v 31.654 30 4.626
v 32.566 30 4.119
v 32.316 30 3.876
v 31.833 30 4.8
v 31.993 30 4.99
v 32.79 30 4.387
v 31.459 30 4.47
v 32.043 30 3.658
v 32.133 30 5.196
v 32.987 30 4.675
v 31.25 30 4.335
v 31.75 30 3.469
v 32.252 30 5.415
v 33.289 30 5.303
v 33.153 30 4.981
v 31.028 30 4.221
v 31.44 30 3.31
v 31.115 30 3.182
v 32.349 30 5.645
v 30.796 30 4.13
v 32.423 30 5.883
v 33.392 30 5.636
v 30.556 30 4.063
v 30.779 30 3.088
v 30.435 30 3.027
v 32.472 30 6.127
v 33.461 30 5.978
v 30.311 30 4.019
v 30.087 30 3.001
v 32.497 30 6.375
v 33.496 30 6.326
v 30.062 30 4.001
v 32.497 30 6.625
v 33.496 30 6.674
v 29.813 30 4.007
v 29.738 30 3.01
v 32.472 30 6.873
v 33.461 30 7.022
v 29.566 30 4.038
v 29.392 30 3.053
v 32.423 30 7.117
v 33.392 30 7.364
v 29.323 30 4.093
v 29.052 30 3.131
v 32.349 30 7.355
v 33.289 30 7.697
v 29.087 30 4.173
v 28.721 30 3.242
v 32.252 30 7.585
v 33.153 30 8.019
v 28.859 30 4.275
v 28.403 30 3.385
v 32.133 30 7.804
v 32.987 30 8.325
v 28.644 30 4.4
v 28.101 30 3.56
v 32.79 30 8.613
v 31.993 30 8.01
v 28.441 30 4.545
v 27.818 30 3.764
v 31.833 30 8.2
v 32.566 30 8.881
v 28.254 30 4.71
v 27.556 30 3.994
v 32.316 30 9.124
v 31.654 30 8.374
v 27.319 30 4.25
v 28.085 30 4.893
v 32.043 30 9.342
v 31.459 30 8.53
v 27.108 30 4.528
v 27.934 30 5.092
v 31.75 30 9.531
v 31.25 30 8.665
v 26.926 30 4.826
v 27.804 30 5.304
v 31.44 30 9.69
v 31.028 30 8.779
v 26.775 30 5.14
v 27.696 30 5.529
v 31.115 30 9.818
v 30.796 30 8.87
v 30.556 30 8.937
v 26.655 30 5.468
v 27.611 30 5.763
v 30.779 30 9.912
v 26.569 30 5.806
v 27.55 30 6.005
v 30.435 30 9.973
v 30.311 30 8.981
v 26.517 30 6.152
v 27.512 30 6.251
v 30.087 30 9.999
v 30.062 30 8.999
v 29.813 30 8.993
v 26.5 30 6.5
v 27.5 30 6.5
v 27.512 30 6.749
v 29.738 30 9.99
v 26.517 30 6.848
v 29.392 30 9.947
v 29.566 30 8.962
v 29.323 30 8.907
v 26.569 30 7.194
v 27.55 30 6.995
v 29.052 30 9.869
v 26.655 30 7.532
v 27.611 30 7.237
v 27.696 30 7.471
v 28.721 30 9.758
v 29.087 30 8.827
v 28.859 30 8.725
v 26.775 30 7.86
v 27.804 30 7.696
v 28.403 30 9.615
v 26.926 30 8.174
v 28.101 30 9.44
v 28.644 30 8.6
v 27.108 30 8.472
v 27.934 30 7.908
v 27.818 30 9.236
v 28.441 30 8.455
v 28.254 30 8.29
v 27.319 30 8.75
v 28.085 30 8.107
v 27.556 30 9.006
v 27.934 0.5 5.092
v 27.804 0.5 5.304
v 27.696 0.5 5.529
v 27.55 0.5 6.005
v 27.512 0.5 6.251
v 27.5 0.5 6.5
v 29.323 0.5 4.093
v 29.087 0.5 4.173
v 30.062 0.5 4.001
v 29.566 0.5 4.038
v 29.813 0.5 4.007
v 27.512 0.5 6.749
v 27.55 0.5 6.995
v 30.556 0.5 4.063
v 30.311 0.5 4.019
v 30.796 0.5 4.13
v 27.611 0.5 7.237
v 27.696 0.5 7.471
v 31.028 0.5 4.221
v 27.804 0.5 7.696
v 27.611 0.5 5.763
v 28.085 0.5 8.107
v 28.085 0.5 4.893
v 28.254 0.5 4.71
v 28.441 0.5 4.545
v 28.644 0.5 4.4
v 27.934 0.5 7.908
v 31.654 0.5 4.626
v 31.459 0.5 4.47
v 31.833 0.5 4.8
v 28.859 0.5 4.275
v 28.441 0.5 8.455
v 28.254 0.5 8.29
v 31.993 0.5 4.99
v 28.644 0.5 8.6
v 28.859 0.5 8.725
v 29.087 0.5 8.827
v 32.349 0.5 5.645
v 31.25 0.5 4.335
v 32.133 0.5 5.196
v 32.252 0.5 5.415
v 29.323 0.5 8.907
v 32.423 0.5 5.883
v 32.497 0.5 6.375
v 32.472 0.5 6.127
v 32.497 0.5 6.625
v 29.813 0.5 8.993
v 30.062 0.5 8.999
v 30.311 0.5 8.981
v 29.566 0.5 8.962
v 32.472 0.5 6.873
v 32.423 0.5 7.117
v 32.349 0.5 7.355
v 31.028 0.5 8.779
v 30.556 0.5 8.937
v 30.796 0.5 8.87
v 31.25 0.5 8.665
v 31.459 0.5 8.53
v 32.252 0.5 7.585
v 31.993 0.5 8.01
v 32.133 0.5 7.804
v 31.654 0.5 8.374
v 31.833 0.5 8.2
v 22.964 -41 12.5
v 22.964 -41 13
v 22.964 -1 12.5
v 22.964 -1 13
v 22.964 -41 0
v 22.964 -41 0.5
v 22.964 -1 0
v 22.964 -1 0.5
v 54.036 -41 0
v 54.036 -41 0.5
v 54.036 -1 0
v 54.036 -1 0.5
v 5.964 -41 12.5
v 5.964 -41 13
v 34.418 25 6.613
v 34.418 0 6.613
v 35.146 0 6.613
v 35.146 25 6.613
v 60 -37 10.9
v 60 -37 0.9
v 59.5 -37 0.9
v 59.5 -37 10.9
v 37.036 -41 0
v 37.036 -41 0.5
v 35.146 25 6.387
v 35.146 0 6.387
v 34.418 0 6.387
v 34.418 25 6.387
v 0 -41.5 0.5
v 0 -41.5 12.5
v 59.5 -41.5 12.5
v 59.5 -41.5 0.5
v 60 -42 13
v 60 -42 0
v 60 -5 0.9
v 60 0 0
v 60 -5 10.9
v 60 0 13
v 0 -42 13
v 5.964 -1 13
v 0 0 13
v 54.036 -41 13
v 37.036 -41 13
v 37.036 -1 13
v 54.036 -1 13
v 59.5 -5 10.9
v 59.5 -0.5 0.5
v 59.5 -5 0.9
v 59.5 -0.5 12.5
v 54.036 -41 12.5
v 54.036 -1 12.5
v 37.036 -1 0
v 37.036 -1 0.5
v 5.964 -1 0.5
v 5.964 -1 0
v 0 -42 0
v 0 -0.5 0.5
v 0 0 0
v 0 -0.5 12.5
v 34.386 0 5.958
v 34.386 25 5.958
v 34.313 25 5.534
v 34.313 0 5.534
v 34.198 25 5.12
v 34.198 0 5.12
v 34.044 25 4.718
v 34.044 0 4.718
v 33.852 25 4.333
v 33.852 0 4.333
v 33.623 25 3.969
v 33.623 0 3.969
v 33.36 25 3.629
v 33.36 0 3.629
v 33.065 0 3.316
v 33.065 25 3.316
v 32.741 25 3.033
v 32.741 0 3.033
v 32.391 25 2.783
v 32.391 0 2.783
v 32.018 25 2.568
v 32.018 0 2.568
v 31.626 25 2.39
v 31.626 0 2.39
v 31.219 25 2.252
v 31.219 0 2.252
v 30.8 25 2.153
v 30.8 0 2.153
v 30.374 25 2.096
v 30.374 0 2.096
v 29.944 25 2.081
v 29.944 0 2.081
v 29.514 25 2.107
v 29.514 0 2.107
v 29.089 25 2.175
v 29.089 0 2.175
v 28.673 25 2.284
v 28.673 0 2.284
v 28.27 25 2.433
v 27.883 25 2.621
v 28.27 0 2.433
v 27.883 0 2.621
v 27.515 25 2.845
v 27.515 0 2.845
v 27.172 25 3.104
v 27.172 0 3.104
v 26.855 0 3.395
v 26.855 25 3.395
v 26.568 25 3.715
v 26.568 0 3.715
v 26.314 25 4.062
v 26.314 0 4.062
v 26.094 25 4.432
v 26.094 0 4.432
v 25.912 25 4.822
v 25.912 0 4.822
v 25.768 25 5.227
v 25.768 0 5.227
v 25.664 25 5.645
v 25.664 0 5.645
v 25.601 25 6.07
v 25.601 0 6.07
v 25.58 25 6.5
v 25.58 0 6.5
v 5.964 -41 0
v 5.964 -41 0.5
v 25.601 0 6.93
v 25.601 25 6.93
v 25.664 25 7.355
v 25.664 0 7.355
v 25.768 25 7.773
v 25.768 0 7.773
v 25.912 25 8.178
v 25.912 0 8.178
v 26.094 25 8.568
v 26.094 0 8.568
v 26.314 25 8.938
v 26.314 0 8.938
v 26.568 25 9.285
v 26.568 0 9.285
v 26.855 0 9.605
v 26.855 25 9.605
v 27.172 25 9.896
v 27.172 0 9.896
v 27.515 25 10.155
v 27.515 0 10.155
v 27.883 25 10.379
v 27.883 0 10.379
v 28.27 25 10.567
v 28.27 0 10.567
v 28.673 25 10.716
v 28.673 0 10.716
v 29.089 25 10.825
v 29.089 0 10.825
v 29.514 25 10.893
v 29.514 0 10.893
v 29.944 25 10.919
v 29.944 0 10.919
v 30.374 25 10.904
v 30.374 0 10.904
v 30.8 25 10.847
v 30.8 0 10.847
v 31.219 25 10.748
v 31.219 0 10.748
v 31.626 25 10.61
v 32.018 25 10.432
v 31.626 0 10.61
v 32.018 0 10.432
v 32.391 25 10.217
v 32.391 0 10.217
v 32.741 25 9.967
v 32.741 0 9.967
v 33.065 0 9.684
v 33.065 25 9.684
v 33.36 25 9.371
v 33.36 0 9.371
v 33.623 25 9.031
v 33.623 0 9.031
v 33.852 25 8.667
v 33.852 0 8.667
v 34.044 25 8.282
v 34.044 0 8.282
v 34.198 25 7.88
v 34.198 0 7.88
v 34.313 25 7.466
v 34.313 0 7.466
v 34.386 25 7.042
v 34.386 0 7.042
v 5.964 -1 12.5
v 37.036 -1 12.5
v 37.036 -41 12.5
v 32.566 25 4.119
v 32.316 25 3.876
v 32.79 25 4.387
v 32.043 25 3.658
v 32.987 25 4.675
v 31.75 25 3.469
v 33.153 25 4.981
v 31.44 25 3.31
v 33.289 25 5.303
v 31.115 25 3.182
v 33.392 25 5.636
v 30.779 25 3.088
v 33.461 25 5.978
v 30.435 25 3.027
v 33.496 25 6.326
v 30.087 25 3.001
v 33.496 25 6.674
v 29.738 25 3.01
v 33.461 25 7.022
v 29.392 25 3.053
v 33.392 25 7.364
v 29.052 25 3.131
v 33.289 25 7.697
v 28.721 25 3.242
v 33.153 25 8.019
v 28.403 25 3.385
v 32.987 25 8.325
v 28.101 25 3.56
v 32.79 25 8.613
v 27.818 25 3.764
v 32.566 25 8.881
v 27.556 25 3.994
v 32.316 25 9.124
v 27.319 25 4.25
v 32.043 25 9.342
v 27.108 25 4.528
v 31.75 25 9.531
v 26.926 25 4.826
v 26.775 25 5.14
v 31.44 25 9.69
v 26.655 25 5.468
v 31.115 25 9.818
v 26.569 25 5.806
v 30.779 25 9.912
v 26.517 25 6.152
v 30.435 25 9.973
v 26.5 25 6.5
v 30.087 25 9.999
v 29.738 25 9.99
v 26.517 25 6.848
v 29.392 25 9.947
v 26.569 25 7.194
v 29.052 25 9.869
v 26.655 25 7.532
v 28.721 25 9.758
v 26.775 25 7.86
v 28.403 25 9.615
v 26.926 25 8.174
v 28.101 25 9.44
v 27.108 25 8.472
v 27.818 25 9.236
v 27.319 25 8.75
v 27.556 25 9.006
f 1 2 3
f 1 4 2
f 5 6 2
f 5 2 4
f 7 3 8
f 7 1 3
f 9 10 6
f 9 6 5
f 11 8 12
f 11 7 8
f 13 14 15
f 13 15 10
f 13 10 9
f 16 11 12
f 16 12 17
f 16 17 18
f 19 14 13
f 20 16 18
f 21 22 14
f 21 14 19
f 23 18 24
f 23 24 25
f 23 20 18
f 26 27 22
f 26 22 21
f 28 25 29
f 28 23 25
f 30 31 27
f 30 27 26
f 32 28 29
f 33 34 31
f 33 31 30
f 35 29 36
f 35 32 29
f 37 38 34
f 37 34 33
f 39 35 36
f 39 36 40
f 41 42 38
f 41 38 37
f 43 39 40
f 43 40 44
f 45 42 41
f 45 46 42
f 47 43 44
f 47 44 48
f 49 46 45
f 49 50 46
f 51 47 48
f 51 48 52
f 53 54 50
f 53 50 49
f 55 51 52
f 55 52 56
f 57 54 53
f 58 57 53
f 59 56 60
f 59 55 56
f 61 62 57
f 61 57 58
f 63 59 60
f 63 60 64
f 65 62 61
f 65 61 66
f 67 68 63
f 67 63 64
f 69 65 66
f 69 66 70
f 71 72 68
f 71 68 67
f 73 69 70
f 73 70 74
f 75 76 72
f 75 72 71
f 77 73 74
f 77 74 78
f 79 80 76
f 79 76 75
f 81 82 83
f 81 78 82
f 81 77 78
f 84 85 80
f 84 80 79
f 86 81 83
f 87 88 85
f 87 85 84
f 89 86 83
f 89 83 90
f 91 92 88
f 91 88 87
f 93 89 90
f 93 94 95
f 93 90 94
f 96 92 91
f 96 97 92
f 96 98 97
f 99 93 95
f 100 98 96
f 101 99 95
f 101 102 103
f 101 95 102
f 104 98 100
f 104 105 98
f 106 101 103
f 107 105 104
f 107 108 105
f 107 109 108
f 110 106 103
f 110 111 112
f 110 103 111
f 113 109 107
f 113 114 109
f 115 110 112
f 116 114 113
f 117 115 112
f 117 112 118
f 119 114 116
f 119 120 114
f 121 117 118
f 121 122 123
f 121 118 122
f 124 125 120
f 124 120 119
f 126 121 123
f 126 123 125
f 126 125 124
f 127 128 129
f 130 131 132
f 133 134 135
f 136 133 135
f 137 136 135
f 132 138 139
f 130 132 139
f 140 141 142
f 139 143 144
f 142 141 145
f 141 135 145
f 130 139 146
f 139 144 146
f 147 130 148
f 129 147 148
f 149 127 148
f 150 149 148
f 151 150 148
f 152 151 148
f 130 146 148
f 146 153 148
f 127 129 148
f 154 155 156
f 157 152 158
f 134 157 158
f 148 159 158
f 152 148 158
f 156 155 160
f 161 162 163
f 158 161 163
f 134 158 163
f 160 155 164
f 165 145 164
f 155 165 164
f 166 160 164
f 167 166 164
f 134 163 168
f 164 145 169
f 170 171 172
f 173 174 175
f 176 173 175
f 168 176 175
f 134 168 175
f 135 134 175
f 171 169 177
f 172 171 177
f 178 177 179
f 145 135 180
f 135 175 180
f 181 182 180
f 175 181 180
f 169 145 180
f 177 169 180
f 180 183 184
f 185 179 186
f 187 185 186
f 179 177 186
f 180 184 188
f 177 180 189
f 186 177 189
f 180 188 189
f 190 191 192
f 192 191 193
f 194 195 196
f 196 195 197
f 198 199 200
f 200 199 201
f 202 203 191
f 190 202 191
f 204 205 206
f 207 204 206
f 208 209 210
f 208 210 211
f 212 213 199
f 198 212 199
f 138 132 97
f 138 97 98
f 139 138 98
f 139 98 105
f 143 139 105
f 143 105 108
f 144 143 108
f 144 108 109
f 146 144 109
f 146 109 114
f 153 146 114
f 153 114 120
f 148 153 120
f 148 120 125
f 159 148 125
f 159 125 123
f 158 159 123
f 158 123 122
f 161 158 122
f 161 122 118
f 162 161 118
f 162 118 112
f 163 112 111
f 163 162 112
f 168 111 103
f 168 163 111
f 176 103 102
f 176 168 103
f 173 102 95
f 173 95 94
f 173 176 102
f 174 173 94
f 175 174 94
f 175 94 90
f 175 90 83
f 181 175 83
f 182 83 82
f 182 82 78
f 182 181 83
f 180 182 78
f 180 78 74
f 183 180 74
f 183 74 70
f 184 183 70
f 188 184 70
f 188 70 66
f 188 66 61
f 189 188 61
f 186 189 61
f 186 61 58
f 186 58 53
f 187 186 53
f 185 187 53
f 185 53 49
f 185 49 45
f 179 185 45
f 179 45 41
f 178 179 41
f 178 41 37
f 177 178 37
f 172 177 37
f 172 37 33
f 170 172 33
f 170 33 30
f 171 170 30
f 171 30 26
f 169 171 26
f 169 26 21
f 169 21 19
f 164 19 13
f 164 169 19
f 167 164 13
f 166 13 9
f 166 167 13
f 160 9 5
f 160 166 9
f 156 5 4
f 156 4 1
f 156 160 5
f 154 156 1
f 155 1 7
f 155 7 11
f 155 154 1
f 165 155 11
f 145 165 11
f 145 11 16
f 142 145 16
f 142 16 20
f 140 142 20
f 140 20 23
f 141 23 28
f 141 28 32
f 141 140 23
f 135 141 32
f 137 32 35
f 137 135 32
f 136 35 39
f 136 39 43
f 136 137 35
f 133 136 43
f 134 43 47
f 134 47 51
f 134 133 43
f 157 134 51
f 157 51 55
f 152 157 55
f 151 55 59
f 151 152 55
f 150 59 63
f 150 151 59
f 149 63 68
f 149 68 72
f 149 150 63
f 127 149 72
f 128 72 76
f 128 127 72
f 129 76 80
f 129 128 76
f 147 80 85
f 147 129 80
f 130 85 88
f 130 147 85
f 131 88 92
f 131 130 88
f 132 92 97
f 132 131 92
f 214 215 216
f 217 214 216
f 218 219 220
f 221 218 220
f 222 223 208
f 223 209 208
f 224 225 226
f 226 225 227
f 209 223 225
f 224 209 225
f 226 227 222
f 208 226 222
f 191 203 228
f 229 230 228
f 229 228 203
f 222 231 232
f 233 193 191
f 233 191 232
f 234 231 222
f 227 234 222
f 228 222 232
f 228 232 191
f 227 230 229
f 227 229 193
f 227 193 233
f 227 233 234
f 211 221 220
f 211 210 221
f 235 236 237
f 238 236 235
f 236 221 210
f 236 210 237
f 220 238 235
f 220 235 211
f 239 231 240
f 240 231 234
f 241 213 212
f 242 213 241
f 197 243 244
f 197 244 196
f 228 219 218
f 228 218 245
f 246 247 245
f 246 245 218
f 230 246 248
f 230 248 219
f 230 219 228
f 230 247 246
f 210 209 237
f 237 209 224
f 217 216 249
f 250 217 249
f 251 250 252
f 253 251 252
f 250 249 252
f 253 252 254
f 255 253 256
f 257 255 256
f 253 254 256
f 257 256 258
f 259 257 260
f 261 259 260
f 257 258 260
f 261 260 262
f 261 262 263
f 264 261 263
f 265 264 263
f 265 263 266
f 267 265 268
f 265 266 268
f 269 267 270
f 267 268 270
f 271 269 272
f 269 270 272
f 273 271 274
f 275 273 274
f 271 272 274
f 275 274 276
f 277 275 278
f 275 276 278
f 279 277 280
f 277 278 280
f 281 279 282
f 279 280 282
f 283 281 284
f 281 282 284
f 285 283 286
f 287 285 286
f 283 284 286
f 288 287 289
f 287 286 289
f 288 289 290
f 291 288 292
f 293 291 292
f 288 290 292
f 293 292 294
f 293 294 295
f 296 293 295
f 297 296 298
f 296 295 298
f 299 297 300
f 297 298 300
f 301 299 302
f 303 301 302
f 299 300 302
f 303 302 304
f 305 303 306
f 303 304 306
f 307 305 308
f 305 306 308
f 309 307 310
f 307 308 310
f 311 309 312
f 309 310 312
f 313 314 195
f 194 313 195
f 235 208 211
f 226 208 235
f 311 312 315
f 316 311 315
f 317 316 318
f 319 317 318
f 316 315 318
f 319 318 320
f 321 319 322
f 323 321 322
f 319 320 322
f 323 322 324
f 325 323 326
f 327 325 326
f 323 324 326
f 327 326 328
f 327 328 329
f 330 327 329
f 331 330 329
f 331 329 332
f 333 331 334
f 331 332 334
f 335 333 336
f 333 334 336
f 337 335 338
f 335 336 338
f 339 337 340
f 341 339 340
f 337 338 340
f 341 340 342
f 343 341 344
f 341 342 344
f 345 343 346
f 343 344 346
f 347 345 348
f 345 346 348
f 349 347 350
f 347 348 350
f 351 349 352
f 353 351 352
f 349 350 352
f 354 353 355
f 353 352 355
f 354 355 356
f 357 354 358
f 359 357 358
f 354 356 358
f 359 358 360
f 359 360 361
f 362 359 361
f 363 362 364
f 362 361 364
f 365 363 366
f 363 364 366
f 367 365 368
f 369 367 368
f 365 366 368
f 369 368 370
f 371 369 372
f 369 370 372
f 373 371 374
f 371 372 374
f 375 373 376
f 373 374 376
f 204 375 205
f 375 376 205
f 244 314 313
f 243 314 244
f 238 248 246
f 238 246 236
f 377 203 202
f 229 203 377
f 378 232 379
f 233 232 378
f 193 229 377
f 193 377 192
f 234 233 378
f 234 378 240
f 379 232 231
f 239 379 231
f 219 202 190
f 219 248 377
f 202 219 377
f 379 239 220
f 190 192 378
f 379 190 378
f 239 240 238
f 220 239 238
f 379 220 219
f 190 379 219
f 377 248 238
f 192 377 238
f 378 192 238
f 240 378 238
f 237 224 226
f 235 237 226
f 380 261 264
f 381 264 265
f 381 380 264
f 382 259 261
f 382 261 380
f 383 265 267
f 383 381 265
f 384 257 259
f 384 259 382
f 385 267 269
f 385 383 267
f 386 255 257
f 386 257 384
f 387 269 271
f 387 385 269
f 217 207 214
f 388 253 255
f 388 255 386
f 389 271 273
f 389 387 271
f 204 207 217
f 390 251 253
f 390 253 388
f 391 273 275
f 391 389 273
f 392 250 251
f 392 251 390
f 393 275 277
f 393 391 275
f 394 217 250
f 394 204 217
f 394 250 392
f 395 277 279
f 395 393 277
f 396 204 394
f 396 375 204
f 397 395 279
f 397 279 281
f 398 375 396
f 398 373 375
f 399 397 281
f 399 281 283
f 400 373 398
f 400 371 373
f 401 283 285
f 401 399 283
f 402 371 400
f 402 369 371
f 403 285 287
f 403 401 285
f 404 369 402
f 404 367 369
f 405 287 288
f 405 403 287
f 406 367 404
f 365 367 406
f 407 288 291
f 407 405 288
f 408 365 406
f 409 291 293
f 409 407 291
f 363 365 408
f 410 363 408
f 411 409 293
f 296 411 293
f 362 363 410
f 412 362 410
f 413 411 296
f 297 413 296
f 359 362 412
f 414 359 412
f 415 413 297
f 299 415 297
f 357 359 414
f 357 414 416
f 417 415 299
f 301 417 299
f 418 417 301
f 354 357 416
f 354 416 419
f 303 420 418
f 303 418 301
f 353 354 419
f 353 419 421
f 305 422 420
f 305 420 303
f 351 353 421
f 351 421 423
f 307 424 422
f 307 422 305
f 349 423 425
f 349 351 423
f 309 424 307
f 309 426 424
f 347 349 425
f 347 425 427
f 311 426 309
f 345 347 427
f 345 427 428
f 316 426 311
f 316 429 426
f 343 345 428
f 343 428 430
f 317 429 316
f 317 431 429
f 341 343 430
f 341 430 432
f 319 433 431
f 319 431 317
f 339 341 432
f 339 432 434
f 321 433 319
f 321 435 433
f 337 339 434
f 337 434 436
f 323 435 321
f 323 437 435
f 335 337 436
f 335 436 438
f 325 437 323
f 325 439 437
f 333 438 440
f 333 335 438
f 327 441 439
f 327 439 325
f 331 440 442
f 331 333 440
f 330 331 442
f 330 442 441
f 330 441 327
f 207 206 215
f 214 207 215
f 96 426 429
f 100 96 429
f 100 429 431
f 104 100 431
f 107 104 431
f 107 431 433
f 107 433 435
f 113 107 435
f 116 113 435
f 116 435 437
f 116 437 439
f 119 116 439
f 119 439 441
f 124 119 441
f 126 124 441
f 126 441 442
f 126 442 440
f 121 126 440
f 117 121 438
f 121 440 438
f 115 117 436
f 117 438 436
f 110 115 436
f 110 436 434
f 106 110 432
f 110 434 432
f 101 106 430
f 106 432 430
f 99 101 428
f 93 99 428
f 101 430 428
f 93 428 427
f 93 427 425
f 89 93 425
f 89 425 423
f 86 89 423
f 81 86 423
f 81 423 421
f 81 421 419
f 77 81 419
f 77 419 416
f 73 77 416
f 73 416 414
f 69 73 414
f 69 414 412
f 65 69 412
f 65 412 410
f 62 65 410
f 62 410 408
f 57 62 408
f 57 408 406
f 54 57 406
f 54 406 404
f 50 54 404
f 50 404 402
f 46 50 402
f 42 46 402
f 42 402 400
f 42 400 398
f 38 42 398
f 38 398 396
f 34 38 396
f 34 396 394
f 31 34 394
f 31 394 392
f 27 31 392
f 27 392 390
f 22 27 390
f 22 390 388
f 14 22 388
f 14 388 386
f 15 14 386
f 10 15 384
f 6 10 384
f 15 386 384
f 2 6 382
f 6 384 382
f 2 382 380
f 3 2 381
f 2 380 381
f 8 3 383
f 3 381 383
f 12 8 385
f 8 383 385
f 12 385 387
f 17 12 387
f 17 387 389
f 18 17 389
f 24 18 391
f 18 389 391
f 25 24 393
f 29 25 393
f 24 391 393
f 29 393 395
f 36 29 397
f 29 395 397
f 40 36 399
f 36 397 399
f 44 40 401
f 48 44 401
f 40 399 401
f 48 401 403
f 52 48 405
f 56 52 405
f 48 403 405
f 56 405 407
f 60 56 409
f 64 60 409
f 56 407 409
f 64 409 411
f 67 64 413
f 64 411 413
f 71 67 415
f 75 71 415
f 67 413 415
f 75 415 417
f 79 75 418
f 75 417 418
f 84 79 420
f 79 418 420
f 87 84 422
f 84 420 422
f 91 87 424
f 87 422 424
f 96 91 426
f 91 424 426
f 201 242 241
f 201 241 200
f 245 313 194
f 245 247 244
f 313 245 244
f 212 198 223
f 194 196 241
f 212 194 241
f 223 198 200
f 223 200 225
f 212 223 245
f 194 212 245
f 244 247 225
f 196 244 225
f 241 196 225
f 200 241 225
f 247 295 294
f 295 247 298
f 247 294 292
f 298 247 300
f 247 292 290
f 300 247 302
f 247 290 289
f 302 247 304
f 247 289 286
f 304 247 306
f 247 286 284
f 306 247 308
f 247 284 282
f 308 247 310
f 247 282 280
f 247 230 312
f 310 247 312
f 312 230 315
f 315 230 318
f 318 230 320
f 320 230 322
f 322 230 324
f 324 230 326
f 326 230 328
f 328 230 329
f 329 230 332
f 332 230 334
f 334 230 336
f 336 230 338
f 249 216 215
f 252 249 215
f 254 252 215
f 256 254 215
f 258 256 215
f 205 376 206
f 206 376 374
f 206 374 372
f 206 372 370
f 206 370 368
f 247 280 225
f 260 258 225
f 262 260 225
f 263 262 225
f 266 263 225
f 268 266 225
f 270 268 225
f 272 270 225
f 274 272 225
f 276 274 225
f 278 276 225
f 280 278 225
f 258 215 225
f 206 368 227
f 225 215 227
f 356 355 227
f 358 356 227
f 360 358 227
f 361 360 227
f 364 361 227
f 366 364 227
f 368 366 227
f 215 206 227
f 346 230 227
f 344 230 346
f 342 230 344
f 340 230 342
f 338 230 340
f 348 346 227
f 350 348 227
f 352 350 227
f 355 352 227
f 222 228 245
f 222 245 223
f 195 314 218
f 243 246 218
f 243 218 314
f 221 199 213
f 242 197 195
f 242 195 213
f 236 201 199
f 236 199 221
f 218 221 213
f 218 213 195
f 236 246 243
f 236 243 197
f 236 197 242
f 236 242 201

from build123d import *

# Parameters (mm, degrees)
F0_W      = 60
F0_H      = 13
F1_DEPTH  = 42
F2_T      = -0.5
F3_W      = 32
F3_H      = 10
F4_DEPTH  = 25
F5_W      = 17
F5_H      = 40
F6_DEPTH  = 25
F7_R      = 3.5
F8_DEPTH  = 30
F9_T      = -1
F10_R     = 3.5
F11_DEPTH = 25


with BuildPart() as f1:
    # F0 (on Front) → F1 (new body)
    with BuildSketch(Plane.XZ):
        with Locations((30, 6.5)):
            Rectangle(F0_W, F0_H)
    extrude(amount=F1_DEPTH)

    # F2
    f2_openings = [f1.faces().sort_by_distance(p)[0] for p in [
        (0, -21, 6.5),
    ]]
    offset(amount=F2_T, openings=f2_openings)

    # F3 (on face) → F4 (cut)
    with BuildSketch(Plane.YZ.offset(60)):
        with Locations((-21, 5.9)):
            Rectangle(F3_W, F3_H)
    extrude(amount=-F4_DEPTH, mode=Mode.SUBTRACT)

    # F5 (on face) → F6 (cut)
    with BuildSketch(Plane.XY.offset(13)):
        with Locations((14.4643624128, -21)):
            Rectangle(F5_W, F5_H)
        with Locations((45.5356375872, -21)):
            Rectangle(F5_W, F5_H)
    extrude(amount=-F6_DEPTH, mode=Mode.SUBTRACT)

    # F7 (on face) → F8 (join)
    with BuildSketch(Plane(origin=(0, 0, 0), x_dir=(-1, 0, 0), z_dir=(0, 1, 0))):
        with Locations((-30, 6.5)):
            Circle(F7_R)
    extrude(amount=F8_DEPTH)

    # F9
    f9_openings = [f1.faces().sort_by_distance(p)[0] for p in [
        (30, 30, 6.5),
    ]]
    offset(amount=F9_T, openings=f9_openings)

    # F10 (on face) → F11 (join)
    with BuildSketch(Plane(origin=(0, 0, 0), x_dir=(-1, 0, 0), z_dir=(0, 1, 0))):
        with BuildLine():
            Line((-34.4180972565, 6.3872897981), (-34.4180972565, 6.6127102019))
            ThreePointArc((-34.4180972565, 6.6127102019), (-34.4195346992, 6.5), (-34.4180972565, 6.3872897981))
        make_face()
        with BuildLine():
            ThreePointArc((-34.4180972565, 6.3872897981), (-29.9436403161, 2.0808246761), (-25.5804653008, 6.5))
            ThreePointArc((-25.5804653008, 6.5), (-29.9436403161, 10.9191753239), (-34.4180972565, 6.6127102019))
            Line((-34.4180972565, 6.6127102019), (-34.4180972565, 6.3872897981))
        make_face()
        with Locations((-30, 6.5)):
            Circle(F10_R, mode=Mode.SUBTRACT)
        with BuildLine():
            ThreePointArc((-34.4180972565, 6.3872897981), (-34.4195346992, 6.5), (-34.4180972565, 6.6127102019))
            Line((-34.4180972565, 6.6127102019), (-35.146126033, 6.6127102019))
            Line((-35.146126033, 6.6127102019), (-35.146126033, 6.3872897981))
            Line((-35.146126033, 6.3872897981), (-34.4180972565, 6.3872897981))
        make_face()
    extrude(amount=F11_DEPTH)


solid = f1.part
